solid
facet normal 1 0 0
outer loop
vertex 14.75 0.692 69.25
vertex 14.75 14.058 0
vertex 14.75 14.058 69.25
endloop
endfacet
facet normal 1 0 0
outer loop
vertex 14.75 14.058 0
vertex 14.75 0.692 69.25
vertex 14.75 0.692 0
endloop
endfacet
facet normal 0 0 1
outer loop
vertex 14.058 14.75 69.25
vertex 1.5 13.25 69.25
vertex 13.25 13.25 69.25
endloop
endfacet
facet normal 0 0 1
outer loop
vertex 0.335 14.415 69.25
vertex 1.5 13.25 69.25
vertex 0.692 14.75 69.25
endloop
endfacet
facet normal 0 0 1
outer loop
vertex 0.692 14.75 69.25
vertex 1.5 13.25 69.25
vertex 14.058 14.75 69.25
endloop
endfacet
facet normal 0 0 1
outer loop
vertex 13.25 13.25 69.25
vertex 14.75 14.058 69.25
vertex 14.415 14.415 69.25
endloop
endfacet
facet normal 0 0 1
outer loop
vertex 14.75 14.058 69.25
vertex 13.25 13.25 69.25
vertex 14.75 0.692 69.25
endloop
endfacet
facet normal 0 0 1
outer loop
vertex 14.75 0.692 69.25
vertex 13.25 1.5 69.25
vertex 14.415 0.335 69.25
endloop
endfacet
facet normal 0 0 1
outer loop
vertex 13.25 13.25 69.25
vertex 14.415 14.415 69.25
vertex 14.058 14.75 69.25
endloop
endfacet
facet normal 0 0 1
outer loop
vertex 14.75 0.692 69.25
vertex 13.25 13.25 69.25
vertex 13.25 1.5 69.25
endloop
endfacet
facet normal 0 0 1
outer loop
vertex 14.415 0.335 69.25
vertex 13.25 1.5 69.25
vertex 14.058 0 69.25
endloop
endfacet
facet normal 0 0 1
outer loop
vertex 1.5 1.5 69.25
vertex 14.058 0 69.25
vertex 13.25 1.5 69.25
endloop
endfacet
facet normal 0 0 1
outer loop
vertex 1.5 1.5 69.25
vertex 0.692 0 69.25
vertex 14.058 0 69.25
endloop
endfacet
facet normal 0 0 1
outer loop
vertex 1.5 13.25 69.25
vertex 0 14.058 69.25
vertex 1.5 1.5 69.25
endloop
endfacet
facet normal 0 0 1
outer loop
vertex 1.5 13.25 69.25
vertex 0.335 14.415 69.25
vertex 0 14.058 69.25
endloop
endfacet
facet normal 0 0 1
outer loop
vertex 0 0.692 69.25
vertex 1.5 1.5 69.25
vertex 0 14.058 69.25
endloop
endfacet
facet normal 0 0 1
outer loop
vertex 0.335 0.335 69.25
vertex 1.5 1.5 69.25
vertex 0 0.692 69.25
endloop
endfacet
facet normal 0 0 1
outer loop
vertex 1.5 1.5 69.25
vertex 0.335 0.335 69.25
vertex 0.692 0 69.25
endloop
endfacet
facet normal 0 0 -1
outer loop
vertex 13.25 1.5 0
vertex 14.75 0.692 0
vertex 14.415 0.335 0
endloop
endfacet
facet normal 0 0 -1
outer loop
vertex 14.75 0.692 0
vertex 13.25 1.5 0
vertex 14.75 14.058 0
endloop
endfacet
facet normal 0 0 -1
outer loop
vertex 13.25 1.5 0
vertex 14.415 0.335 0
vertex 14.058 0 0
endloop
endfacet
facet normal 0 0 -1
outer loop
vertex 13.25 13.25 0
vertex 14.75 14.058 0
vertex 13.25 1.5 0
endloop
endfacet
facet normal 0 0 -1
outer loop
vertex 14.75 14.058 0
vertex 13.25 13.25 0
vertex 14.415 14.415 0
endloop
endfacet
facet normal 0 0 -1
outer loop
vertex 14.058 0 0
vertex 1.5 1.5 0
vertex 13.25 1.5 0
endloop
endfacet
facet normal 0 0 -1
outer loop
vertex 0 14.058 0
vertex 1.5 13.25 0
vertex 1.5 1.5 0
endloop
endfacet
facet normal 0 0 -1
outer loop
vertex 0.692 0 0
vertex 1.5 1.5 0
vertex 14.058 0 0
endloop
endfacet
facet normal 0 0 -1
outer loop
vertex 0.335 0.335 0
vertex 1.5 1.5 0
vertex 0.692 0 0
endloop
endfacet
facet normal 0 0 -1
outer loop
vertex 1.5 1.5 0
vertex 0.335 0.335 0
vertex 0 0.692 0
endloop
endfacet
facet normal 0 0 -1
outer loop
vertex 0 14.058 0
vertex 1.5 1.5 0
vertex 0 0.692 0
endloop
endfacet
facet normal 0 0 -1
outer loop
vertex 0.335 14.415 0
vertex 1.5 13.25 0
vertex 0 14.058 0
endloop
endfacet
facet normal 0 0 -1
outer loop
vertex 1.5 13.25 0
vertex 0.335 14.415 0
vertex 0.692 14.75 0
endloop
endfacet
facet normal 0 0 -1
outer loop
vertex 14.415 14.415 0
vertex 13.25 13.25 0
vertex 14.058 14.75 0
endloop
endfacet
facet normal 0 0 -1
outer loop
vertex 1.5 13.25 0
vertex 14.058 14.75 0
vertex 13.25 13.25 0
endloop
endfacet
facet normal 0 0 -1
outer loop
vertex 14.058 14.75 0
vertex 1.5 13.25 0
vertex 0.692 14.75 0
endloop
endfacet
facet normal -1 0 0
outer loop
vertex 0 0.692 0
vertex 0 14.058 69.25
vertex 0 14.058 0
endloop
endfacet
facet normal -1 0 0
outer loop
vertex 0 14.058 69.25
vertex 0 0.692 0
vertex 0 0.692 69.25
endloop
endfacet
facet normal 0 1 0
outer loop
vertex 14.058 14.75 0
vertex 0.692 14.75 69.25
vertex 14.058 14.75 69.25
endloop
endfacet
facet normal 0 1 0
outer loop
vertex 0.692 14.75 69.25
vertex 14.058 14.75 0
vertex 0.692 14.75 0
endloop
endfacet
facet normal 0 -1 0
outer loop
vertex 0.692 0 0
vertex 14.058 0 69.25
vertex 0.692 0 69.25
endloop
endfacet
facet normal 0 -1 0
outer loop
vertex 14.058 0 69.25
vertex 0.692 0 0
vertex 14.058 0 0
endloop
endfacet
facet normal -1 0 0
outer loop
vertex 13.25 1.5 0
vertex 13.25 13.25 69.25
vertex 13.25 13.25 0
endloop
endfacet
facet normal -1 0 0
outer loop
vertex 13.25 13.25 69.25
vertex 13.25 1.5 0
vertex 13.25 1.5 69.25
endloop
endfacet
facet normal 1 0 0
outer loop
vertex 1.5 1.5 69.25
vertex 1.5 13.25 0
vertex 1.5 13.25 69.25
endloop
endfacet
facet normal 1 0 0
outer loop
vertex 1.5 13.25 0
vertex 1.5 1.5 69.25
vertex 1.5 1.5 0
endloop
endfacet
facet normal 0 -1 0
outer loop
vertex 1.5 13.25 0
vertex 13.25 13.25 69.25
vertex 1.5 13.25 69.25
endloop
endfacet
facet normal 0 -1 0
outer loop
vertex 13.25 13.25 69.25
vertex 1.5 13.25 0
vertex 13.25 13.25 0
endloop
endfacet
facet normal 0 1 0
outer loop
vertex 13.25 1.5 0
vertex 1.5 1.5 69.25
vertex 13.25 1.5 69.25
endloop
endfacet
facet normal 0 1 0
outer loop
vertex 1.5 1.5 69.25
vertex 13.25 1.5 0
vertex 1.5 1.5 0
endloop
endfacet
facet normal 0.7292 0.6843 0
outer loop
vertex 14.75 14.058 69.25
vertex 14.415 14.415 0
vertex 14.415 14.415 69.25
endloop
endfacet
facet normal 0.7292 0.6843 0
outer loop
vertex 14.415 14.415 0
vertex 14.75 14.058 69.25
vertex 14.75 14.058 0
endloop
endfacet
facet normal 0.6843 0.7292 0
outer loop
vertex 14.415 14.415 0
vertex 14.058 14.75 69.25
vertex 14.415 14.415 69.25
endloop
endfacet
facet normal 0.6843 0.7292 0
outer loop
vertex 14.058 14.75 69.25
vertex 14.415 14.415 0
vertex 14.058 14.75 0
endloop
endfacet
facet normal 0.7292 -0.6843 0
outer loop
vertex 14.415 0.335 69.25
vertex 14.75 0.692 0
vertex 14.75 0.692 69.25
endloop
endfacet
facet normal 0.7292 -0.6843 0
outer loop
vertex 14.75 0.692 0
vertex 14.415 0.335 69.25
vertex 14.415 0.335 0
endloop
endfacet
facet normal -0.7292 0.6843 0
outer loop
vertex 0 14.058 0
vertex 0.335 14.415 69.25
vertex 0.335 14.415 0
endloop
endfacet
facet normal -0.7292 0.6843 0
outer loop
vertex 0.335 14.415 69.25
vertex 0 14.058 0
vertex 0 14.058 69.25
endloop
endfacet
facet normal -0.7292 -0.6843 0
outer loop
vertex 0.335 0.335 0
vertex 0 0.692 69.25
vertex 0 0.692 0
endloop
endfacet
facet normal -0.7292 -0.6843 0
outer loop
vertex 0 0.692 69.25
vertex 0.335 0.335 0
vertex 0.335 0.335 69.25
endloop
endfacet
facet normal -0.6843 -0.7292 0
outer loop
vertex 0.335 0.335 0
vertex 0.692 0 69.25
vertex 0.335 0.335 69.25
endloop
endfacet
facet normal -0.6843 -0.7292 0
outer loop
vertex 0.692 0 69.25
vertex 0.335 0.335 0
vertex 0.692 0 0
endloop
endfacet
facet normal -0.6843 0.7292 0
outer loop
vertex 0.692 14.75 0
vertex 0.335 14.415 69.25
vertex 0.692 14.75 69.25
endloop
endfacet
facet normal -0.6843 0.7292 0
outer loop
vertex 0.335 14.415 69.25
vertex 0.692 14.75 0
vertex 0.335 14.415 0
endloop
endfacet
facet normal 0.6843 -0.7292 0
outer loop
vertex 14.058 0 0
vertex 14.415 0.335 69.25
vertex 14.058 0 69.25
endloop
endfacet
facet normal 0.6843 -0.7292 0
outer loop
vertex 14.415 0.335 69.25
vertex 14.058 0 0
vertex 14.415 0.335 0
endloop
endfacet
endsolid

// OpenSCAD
// panther box remix

part=3;

s=4.5/3; //scale
gap=0.25;
inset=10;

module panther() {
  scale([s,s,s])
  import("../panter.stl");
}

if (part==1) {
  difference() {
    rotate([90,0,0])
      panther();
    
    translate([-100*s,-100*s,-200*s])
      cube([200*s,200*s,200*s]);
    
    translate([0,-31*s,0])
      cube([inset*s,inset*s,19*s]);
  }
}
else if (part==2) {
  difference() {
    rotate([-90,0,0])
      panther();
    
    translate([-100*s,-100*s,-200*s])
      cube([200*s,200*s,200*s]);
    
    translate([0,21*s,0])
      cube([inset*s,inset*s,28*s]);
  }
}
else {
  wall=1*s;
  side=inset*s-gap;
  intersection(){
    difference() {
      cube([side,side,(19+28)*s-gap-1]);
      translate([wall,wall,0])
        cube([side-2*wall,side-2*wall,(19+28)*s]);
    }
    translate([side/2,side/2,0])
      cylinder($fn=96,h=(19+28)*s,d=1.35*side);
  }
}
